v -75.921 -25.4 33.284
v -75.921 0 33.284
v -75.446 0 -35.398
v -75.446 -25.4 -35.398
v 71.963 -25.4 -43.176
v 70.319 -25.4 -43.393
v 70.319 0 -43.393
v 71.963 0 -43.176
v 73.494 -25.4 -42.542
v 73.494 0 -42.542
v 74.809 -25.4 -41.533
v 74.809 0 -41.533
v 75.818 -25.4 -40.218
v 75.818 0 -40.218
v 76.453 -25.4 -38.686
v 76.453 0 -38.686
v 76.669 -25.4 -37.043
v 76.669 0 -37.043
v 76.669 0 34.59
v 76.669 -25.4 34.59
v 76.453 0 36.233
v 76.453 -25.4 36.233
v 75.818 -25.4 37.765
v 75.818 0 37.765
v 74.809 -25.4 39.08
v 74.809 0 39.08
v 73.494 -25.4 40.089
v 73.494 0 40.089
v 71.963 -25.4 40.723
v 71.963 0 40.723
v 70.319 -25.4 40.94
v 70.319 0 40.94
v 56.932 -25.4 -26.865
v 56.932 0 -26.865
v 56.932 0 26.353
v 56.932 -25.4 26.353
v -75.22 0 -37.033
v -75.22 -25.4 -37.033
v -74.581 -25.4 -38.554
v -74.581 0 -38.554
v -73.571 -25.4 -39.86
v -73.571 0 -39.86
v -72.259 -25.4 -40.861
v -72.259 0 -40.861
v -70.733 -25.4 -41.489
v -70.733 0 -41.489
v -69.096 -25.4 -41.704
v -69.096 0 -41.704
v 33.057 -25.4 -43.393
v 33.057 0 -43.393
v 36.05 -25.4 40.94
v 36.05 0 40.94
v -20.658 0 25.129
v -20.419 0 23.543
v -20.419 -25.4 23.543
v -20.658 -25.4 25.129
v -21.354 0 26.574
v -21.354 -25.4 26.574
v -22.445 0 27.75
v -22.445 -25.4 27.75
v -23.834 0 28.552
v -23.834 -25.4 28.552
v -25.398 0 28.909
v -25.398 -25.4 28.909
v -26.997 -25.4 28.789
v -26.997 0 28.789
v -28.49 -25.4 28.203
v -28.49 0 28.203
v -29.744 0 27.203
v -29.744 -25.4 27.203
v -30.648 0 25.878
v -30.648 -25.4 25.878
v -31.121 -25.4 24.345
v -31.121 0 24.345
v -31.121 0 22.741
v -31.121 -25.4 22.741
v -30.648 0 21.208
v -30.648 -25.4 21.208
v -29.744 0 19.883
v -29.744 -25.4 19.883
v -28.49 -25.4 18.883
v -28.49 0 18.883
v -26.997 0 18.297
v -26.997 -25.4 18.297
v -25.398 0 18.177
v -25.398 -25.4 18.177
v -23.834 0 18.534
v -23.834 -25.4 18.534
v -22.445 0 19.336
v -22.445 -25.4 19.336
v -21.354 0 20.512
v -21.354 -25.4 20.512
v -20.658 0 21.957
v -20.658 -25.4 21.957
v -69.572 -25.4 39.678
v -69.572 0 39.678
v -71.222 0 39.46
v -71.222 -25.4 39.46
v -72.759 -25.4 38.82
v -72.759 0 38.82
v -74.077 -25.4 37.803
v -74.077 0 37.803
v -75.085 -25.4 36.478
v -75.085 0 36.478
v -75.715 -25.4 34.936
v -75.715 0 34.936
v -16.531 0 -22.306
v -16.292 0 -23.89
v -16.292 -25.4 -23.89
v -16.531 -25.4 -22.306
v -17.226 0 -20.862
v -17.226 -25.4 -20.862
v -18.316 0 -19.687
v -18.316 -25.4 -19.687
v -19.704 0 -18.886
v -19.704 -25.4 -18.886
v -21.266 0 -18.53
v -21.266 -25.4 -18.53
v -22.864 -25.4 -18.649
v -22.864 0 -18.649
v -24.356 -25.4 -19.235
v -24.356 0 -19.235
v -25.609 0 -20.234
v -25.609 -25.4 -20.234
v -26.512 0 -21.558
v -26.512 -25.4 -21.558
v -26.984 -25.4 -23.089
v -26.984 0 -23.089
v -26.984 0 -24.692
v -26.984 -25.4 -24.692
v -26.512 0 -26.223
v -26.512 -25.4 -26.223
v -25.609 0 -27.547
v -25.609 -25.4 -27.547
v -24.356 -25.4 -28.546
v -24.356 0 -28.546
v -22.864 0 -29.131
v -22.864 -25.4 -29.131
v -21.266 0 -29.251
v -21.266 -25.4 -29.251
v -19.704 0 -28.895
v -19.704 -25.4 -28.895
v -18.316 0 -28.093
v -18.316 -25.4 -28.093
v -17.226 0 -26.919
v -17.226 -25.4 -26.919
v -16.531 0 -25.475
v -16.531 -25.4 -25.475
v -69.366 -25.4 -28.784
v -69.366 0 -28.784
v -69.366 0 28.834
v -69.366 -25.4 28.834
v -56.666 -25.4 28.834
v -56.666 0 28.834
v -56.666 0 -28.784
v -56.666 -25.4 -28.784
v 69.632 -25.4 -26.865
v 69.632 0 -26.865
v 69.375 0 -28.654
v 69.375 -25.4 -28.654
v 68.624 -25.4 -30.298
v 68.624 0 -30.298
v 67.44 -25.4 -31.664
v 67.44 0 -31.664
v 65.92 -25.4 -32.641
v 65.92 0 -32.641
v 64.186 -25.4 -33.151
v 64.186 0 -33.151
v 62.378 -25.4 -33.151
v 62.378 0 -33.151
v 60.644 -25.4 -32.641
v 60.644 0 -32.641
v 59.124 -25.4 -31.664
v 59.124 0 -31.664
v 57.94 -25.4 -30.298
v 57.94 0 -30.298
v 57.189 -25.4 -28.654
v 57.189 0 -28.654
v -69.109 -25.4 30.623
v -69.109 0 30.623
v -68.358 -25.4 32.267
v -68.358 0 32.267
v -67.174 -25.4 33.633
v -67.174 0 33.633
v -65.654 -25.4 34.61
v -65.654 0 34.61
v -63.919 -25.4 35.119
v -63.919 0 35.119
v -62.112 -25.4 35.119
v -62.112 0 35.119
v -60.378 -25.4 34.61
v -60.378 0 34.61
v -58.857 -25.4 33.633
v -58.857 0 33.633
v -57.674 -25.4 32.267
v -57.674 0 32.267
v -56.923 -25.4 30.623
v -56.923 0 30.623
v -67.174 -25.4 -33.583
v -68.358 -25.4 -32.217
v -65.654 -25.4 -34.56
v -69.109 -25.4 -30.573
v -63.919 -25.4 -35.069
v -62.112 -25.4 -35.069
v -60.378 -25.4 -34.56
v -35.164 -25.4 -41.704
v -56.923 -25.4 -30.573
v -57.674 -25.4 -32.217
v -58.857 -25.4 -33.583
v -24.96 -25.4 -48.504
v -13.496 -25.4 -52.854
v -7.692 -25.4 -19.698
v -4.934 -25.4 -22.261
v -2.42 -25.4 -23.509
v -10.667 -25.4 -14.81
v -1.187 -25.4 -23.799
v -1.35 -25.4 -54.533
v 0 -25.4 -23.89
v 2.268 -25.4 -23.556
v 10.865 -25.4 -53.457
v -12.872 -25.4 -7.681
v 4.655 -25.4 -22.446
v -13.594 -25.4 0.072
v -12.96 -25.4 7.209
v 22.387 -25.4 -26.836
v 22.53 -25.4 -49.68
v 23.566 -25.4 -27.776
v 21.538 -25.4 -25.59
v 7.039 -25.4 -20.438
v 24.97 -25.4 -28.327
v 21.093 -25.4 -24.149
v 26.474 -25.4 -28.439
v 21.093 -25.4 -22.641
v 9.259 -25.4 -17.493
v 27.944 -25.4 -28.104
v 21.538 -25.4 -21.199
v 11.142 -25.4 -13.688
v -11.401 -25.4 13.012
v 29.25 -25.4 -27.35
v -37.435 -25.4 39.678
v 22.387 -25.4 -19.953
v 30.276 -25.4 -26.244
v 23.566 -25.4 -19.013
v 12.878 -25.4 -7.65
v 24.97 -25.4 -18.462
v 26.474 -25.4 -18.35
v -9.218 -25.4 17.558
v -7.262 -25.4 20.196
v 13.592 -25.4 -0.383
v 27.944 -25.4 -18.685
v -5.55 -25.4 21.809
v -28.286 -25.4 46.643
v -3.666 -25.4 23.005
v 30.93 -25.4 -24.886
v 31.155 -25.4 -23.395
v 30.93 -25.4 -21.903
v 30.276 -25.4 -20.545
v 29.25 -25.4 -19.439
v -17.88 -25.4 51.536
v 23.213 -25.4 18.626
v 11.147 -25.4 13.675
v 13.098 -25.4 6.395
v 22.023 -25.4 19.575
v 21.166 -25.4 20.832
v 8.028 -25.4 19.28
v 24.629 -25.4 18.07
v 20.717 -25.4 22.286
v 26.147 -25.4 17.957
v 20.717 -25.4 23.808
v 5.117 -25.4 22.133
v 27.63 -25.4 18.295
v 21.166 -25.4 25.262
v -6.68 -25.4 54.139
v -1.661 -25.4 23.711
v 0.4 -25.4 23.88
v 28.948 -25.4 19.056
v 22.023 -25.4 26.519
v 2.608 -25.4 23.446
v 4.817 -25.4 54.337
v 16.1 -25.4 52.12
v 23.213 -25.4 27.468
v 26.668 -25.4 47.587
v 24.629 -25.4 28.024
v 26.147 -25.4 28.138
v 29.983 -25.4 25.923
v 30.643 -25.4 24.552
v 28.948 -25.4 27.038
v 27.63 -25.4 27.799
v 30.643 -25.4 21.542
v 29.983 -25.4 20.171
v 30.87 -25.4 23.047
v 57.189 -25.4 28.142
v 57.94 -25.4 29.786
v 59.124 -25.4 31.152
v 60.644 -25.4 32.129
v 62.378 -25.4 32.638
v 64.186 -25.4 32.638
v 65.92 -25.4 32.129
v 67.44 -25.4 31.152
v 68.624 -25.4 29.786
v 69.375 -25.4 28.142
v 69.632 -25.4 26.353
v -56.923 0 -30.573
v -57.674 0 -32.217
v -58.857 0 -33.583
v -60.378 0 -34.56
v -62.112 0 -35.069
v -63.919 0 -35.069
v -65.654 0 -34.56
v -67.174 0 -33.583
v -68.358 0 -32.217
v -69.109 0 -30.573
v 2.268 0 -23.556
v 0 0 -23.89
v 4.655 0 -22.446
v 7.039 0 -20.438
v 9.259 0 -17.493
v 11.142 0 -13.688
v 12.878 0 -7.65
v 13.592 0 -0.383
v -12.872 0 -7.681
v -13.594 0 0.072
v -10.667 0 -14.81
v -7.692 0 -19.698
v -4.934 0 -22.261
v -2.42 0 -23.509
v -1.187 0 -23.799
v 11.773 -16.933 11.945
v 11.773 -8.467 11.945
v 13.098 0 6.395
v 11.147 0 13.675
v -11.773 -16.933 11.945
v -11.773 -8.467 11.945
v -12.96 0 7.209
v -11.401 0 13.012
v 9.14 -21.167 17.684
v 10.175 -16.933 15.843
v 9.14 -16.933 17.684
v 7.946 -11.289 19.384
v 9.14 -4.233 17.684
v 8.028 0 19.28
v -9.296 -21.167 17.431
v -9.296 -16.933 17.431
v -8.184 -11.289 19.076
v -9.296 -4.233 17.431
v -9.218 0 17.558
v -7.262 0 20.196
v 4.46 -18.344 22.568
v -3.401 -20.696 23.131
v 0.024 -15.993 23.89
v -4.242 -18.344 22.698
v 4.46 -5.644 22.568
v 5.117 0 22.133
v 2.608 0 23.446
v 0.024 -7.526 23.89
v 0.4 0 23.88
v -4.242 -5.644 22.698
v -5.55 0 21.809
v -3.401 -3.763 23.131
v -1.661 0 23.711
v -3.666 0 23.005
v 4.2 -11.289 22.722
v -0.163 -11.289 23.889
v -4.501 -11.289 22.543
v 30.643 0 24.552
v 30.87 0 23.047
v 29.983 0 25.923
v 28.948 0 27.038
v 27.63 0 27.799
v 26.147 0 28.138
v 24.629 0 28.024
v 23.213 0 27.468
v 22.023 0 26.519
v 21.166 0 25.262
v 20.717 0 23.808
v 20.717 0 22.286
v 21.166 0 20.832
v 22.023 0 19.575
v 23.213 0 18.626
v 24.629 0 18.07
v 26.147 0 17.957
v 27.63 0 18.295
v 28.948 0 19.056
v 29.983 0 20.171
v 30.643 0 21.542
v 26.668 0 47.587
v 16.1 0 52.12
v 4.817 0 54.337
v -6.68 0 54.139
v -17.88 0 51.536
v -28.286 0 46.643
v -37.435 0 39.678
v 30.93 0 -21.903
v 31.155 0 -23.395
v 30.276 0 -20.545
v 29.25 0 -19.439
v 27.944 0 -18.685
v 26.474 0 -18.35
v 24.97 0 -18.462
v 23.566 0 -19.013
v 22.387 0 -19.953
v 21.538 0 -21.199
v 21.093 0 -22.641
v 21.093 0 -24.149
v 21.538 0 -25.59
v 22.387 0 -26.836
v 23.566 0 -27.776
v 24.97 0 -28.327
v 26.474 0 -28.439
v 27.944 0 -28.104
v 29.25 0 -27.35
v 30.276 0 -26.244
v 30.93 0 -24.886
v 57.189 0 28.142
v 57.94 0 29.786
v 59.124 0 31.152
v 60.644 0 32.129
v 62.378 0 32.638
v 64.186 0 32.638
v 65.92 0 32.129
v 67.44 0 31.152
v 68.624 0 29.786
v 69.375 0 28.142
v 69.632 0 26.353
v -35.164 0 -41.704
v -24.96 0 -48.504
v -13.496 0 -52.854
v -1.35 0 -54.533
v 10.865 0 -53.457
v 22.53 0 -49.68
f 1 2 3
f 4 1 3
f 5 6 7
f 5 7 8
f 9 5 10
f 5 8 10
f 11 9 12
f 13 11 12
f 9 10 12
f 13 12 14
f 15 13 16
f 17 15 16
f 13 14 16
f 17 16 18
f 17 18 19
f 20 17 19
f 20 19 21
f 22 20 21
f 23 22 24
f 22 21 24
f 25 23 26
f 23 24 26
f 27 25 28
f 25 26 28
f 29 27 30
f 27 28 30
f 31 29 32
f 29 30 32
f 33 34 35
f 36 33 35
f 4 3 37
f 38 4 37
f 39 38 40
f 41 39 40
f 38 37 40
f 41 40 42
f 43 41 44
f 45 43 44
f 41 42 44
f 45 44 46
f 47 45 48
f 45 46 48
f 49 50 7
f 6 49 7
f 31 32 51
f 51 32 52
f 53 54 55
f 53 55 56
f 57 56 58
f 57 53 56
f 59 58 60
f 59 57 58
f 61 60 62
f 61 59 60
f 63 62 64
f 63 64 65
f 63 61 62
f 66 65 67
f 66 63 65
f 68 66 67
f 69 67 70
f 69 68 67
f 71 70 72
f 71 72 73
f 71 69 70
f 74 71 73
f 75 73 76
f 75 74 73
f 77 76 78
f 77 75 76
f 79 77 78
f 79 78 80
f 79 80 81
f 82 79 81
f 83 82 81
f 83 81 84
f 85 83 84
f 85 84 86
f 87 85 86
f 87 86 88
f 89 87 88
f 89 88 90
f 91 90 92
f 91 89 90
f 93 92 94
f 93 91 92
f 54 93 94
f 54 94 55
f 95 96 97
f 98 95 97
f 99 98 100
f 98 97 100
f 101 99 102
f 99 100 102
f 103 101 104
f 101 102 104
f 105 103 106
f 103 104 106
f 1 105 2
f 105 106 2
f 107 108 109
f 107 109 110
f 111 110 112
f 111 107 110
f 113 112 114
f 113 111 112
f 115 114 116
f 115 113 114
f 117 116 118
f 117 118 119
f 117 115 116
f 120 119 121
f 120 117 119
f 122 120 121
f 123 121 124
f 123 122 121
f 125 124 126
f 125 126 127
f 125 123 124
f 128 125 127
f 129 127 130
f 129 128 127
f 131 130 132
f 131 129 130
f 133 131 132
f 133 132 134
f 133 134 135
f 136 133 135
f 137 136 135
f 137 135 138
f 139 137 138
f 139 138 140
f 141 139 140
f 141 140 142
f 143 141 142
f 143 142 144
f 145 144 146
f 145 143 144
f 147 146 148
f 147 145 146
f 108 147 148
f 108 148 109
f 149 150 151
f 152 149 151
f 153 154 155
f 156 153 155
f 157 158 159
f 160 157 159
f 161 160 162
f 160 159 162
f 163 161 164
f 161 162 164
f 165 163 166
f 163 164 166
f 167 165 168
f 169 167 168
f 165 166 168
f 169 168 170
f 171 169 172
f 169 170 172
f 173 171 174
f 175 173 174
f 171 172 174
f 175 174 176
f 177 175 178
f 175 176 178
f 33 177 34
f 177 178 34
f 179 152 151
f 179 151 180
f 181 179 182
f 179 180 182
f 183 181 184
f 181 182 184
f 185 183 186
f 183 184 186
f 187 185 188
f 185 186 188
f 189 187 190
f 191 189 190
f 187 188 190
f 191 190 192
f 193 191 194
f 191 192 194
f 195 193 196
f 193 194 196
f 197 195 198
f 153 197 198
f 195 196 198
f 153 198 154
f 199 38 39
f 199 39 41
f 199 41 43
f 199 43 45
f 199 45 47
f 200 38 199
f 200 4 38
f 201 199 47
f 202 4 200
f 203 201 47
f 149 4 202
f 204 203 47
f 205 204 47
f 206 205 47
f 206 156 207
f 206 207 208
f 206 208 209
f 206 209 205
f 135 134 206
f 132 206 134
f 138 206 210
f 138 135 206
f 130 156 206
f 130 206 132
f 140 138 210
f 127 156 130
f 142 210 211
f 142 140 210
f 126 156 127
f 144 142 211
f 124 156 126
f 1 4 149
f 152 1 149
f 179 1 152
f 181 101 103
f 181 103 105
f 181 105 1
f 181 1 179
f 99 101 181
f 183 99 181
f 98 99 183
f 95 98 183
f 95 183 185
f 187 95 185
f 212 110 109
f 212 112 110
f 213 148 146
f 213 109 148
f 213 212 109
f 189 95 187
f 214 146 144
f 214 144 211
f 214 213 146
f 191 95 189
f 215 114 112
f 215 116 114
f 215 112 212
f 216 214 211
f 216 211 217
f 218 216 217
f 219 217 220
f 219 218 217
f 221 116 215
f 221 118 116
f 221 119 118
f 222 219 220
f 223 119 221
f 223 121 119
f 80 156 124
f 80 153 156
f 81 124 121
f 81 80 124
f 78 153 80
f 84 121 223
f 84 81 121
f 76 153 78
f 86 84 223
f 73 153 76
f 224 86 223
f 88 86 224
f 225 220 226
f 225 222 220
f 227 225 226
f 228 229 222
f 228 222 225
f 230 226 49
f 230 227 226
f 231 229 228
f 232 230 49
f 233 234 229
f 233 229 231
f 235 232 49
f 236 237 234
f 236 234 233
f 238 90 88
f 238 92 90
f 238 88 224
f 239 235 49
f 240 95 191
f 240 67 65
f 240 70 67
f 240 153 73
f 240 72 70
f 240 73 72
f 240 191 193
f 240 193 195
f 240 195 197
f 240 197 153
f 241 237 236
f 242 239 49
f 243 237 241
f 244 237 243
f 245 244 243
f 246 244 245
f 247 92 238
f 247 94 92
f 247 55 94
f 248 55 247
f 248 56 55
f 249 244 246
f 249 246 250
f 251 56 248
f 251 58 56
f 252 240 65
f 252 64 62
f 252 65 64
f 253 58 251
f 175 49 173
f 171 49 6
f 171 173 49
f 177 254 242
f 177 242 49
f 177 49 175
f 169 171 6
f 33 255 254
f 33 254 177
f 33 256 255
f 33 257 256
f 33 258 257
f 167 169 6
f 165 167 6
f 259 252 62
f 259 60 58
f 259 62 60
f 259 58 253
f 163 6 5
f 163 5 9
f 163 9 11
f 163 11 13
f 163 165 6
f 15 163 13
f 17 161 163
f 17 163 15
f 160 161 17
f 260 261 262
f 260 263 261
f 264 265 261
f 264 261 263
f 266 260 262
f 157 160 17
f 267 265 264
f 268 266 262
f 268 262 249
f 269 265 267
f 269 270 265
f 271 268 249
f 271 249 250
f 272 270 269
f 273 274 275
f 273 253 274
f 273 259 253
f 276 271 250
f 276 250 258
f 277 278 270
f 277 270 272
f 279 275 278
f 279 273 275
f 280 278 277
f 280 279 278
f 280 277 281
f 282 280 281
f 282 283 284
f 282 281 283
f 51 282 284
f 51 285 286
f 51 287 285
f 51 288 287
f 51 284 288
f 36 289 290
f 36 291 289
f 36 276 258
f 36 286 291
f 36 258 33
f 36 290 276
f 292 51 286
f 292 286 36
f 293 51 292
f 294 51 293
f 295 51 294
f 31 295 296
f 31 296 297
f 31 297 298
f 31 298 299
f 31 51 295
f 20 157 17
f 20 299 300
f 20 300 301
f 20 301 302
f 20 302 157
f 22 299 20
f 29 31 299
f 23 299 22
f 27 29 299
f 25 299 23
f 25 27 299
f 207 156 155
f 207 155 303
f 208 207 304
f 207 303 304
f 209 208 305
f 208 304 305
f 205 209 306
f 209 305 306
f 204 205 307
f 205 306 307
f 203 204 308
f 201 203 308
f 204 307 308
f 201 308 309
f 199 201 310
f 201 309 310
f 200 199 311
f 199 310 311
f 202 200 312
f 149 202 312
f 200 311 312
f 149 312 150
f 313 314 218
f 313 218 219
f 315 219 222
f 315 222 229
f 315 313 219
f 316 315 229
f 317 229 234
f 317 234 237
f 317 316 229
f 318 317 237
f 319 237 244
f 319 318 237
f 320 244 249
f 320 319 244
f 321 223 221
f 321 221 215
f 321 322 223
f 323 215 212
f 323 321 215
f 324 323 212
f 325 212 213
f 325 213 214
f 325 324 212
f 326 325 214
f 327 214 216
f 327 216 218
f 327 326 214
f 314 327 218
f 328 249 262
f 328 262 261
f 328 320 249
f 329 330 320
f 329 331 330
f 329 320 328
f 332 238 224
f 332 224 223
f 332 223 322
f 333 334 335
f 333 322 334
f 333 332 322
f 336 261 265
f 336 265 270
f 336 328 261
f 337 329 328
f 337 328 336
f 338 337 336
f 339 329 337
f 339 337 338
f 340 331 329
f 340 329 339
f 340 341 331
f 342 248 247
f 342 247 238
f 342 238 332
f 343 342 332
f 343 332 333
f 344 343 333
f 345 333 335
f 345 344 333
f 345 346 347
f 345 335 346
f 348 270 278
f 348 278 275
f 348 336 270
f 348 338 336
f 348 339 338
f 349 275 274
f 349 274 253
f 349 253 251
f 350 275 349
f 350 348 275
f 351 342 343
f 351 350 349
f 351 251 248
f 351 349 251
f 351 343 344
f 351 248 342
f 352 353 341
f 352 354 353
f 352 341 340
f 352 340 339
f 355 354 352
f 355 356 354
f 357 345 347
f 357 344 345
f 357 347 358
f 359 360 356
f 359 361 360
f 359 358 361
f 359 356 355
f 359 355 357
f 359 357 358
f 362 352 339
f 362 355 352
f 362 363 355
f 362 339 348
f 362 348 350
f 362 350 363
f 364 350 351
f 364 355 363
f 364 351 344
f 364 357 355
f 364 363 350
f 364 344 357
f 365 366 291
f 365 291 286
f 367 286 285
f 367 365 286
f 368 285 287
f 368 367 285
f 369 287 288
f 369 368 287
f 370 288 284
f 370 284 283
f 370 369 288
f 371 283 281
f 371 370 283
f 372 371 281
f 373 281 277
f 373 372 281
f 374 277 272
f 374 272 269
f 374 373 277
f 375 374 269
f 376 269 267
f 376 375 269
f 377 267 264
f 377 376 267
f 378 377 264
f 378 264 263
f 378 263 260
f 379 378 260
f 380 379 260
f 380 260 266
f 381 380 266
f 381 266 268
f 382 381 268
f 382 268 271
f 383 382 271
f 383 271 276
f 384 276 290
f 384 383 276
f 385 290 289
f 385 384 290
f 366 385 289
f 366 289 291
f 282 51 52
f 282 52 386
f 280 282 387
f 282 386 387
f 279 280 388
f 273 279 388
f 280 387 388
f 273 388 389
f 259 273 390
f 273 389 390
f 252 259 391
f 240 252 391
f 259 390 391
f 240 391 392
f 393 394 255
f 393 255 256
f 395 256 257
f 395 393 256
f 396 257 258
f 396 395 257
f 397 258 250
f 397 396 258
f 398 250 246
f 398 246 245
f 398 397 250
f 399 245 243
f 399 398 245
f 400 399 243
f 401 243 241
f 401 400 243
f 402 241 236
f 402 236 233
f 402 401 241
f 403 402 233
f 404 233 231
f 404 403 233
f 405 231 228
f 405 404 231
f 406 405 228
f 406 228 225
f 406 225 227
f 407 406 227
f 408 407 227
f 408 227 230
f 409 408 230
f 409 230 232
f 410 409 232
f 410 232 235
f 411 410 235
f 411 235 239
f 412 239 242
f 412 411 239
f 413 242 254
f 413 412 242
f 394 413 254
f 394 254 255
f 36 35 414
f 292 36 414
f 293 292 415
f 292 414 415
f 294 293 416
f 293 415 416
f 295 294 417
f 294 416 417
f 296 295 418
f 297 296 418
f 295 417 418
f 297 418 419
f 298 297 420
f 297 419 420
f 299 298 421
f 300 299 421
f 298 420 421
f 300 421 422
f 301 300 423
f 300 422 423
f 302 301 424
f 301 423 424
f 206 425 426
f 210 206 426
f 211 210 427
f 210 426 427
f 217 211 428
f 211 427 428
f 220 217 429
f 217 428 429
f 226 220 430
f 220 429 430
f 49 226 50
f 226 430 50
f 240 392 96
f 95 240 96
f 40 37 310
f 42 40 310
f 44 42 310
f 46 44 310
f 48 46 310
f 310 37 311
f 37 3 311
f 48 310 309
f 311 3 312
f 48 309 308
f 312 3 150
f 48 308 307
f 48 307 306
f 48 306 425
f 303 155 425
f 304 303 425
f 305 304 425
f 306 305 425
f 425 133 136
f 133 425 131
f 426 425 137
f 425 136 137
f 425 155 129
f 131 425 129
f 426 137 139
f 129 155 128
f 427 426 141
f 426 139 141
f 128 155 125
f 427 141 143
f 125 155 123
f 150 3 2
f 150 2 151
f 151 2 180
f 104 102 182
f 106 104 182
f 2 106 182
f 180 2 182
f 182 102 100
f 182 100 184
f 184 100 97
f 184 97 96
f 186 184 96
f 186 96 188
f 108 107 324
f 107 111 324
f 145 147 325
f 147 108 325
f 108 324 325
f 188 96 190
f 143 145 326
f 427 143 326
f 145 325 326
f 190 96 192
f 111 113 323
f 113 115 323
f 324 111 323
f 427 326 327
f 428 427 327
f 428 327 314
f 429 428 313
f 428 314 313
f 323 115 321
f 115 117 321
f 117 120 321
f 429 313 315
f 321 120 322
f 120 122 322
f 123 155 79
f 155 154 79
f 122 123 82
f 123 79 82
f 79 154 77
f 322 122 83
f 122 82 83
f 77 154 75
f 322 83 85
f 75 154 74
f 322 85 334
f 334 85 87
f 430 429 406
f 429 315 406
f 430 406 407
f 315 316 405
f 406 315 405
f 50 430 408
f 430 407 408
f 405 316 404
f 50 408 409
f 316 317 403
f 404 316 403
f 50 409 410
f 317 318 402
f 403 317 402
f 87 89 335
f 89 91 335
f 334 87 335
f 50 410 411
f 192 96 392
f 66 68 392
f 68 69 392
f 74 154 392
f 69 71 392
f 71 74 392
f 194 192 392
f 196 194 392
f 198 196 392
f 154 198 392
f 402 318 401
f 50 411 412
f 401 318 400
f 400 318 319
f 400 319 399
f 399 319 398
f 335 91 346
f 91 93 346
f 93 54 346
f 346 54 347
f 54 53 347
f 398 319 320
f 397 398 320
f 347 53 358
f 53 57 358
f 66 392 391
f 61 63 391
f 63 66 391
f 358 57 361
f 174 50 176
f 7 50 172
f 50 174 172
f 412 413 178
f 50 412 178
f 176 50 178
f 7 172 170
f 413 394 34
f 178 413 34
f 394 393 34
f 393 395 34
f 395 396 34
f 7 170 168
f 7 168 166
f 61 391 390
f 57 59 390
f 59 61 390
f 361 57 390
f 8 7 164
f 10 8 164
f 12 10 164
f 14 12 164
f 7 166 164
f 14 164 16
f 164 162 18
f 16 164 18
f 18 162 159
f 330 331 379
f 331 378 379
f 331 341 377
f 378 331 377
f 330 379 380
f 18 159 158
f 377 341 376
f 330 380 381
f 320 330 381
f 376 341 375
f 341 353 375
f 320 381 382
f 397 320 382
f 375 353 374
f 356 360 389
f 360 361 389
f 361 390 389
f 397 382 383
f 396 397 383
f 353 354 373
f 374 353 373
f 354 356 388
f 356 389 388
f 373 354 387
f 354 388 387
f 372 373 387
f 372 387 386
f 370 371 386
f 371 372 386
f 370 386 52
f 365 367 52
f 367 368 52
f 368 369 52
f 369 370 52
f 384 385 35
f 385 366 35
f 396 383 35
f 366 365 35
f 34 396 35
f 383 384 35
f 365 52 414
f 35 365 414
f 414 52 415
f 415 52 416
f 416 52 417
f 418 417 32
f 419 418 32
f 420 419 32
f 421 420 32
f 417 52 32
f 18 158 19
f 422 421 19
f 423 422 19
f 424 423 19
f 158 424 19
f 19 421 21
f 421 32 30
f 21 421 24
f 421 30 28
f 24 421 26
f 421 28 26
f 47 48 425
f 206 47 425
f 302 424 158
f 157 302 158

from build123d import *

# Parameters (mm, degrees)
F0_R     = 5.37582
F0_R_2   = 5.059078
F0_R_3   = 5.380898
F0_R_4   = 5.104772
F1_DEPTH = 25.4


with BuildPart() as f1:
    # F0 (on Front) → F1 (new body)
    with BuildSketch(Plane.XZ):
        with BuildLine():
            Line((70.319183, 40.939739), (36.050495, 40.939739))
            ThreePointArc((36.050495, 40.939739), (-0.936502, 54.541942), (-37.434726, 39.677976))
            Line((-37.434726, 39.677976), (-69.571538, 39.677976))
            ThreePointArc((-69.571538, 39.677976), (-74.077171, 37.802545), (-75.921387, 33.284046))
            Line((-75.921387, 33.284046), (-75.446226, -35.397891))
            ThreePointArc((-75.446226, -35.397891), (-73.570947, -39.859594), (-69.096378, -41.703961))
            Line((-69.096378, -41.703961), (-35.163618, -41.703961))
            ThreePointArc((-35.163618, -41.703961), (-1.349798, -54.533279), (33.057325, -43.392554))
            Line((33.057325, -43.392554), (70.319183, -43.392554))
            ThreePointArc((70.319183, -43.392554), (74.809311, -41.532682), (76.669183, -37.042554))
            Line((76.669183, -37.042554), (76.669183, 34.589739))
            ThreePointArc((76.669183, 34.589739), (74.809311, 39.079867), (70.319183, 40.939739))
        make_face()
        with Locations((-21.668151, -23.890361)):
            Circle(F0_R, mode=Mode.SUBTRACT)
        with Locations((26.095688, -23.39454)):
            Circle(F0_R_2, mode=Mode.SUBTRACT)
        with BuildLine():
            Line((56.932073, -26.865274), (56.932073, 26.352569))
            ThreePointArc((56.932073, 26.352569), (63.282073, 32.702569), (69.632073, 26.352569))
            Line((69.632073, 26.352569), (69.632073, -26.865274))
            ThreePointArc((69.632073, -26.865274), (63.282073, -33.215274), (56.932073, -26.865274))
        make_face(mode=Mode.SUBTRACT)
        with BuildLine():
            Line((-69.365789, -28.783619), (-69.365789, 28.833777))
            ThreePointArc((-69.365789, 28.833777), (-63.015789, 35.183777), (-56.665789, 28.833777))
            Line((-56.665789, 28.833777), (-56.665789, -28.783619))
            ThreePointArc((-56.665789, -28.783619), (-63.015789, -35.133619), (-69.365789, -28.783619))
        make_face(mode=Mode.SUBTRACT)
        with BuildLine():
            add(Edge.make_bspline(
                [(0, -23.890361), (23.545601, -23.890361), (11.772801, 11.945181), (0, 47.780722), (-11.772801, 11.945181), (-23.545601, -23.890361), (0, -23.890361)],
                knots=[0, 0, 0, 2.094395, 2.094395, 4.18879, 4.18879, 6.283185, 6.283185, 6.283185], degree=2, weights=[1, 0.5, 1, 0.5, 1, 0.5, 1]))
        make_face(mode=Mode.SUBTRACT)
        with Locations((-25.799975, 23.542933)):
            Circle(F0_R_3, mode=Mode.SUBTRACT)
        with Locations((25.765136, 23.047112)):
            Circle(F0_R_4, mode=Mode.SUBTRACT)
    extrude(amount=F1_DEPTH)


solid = f1.part
